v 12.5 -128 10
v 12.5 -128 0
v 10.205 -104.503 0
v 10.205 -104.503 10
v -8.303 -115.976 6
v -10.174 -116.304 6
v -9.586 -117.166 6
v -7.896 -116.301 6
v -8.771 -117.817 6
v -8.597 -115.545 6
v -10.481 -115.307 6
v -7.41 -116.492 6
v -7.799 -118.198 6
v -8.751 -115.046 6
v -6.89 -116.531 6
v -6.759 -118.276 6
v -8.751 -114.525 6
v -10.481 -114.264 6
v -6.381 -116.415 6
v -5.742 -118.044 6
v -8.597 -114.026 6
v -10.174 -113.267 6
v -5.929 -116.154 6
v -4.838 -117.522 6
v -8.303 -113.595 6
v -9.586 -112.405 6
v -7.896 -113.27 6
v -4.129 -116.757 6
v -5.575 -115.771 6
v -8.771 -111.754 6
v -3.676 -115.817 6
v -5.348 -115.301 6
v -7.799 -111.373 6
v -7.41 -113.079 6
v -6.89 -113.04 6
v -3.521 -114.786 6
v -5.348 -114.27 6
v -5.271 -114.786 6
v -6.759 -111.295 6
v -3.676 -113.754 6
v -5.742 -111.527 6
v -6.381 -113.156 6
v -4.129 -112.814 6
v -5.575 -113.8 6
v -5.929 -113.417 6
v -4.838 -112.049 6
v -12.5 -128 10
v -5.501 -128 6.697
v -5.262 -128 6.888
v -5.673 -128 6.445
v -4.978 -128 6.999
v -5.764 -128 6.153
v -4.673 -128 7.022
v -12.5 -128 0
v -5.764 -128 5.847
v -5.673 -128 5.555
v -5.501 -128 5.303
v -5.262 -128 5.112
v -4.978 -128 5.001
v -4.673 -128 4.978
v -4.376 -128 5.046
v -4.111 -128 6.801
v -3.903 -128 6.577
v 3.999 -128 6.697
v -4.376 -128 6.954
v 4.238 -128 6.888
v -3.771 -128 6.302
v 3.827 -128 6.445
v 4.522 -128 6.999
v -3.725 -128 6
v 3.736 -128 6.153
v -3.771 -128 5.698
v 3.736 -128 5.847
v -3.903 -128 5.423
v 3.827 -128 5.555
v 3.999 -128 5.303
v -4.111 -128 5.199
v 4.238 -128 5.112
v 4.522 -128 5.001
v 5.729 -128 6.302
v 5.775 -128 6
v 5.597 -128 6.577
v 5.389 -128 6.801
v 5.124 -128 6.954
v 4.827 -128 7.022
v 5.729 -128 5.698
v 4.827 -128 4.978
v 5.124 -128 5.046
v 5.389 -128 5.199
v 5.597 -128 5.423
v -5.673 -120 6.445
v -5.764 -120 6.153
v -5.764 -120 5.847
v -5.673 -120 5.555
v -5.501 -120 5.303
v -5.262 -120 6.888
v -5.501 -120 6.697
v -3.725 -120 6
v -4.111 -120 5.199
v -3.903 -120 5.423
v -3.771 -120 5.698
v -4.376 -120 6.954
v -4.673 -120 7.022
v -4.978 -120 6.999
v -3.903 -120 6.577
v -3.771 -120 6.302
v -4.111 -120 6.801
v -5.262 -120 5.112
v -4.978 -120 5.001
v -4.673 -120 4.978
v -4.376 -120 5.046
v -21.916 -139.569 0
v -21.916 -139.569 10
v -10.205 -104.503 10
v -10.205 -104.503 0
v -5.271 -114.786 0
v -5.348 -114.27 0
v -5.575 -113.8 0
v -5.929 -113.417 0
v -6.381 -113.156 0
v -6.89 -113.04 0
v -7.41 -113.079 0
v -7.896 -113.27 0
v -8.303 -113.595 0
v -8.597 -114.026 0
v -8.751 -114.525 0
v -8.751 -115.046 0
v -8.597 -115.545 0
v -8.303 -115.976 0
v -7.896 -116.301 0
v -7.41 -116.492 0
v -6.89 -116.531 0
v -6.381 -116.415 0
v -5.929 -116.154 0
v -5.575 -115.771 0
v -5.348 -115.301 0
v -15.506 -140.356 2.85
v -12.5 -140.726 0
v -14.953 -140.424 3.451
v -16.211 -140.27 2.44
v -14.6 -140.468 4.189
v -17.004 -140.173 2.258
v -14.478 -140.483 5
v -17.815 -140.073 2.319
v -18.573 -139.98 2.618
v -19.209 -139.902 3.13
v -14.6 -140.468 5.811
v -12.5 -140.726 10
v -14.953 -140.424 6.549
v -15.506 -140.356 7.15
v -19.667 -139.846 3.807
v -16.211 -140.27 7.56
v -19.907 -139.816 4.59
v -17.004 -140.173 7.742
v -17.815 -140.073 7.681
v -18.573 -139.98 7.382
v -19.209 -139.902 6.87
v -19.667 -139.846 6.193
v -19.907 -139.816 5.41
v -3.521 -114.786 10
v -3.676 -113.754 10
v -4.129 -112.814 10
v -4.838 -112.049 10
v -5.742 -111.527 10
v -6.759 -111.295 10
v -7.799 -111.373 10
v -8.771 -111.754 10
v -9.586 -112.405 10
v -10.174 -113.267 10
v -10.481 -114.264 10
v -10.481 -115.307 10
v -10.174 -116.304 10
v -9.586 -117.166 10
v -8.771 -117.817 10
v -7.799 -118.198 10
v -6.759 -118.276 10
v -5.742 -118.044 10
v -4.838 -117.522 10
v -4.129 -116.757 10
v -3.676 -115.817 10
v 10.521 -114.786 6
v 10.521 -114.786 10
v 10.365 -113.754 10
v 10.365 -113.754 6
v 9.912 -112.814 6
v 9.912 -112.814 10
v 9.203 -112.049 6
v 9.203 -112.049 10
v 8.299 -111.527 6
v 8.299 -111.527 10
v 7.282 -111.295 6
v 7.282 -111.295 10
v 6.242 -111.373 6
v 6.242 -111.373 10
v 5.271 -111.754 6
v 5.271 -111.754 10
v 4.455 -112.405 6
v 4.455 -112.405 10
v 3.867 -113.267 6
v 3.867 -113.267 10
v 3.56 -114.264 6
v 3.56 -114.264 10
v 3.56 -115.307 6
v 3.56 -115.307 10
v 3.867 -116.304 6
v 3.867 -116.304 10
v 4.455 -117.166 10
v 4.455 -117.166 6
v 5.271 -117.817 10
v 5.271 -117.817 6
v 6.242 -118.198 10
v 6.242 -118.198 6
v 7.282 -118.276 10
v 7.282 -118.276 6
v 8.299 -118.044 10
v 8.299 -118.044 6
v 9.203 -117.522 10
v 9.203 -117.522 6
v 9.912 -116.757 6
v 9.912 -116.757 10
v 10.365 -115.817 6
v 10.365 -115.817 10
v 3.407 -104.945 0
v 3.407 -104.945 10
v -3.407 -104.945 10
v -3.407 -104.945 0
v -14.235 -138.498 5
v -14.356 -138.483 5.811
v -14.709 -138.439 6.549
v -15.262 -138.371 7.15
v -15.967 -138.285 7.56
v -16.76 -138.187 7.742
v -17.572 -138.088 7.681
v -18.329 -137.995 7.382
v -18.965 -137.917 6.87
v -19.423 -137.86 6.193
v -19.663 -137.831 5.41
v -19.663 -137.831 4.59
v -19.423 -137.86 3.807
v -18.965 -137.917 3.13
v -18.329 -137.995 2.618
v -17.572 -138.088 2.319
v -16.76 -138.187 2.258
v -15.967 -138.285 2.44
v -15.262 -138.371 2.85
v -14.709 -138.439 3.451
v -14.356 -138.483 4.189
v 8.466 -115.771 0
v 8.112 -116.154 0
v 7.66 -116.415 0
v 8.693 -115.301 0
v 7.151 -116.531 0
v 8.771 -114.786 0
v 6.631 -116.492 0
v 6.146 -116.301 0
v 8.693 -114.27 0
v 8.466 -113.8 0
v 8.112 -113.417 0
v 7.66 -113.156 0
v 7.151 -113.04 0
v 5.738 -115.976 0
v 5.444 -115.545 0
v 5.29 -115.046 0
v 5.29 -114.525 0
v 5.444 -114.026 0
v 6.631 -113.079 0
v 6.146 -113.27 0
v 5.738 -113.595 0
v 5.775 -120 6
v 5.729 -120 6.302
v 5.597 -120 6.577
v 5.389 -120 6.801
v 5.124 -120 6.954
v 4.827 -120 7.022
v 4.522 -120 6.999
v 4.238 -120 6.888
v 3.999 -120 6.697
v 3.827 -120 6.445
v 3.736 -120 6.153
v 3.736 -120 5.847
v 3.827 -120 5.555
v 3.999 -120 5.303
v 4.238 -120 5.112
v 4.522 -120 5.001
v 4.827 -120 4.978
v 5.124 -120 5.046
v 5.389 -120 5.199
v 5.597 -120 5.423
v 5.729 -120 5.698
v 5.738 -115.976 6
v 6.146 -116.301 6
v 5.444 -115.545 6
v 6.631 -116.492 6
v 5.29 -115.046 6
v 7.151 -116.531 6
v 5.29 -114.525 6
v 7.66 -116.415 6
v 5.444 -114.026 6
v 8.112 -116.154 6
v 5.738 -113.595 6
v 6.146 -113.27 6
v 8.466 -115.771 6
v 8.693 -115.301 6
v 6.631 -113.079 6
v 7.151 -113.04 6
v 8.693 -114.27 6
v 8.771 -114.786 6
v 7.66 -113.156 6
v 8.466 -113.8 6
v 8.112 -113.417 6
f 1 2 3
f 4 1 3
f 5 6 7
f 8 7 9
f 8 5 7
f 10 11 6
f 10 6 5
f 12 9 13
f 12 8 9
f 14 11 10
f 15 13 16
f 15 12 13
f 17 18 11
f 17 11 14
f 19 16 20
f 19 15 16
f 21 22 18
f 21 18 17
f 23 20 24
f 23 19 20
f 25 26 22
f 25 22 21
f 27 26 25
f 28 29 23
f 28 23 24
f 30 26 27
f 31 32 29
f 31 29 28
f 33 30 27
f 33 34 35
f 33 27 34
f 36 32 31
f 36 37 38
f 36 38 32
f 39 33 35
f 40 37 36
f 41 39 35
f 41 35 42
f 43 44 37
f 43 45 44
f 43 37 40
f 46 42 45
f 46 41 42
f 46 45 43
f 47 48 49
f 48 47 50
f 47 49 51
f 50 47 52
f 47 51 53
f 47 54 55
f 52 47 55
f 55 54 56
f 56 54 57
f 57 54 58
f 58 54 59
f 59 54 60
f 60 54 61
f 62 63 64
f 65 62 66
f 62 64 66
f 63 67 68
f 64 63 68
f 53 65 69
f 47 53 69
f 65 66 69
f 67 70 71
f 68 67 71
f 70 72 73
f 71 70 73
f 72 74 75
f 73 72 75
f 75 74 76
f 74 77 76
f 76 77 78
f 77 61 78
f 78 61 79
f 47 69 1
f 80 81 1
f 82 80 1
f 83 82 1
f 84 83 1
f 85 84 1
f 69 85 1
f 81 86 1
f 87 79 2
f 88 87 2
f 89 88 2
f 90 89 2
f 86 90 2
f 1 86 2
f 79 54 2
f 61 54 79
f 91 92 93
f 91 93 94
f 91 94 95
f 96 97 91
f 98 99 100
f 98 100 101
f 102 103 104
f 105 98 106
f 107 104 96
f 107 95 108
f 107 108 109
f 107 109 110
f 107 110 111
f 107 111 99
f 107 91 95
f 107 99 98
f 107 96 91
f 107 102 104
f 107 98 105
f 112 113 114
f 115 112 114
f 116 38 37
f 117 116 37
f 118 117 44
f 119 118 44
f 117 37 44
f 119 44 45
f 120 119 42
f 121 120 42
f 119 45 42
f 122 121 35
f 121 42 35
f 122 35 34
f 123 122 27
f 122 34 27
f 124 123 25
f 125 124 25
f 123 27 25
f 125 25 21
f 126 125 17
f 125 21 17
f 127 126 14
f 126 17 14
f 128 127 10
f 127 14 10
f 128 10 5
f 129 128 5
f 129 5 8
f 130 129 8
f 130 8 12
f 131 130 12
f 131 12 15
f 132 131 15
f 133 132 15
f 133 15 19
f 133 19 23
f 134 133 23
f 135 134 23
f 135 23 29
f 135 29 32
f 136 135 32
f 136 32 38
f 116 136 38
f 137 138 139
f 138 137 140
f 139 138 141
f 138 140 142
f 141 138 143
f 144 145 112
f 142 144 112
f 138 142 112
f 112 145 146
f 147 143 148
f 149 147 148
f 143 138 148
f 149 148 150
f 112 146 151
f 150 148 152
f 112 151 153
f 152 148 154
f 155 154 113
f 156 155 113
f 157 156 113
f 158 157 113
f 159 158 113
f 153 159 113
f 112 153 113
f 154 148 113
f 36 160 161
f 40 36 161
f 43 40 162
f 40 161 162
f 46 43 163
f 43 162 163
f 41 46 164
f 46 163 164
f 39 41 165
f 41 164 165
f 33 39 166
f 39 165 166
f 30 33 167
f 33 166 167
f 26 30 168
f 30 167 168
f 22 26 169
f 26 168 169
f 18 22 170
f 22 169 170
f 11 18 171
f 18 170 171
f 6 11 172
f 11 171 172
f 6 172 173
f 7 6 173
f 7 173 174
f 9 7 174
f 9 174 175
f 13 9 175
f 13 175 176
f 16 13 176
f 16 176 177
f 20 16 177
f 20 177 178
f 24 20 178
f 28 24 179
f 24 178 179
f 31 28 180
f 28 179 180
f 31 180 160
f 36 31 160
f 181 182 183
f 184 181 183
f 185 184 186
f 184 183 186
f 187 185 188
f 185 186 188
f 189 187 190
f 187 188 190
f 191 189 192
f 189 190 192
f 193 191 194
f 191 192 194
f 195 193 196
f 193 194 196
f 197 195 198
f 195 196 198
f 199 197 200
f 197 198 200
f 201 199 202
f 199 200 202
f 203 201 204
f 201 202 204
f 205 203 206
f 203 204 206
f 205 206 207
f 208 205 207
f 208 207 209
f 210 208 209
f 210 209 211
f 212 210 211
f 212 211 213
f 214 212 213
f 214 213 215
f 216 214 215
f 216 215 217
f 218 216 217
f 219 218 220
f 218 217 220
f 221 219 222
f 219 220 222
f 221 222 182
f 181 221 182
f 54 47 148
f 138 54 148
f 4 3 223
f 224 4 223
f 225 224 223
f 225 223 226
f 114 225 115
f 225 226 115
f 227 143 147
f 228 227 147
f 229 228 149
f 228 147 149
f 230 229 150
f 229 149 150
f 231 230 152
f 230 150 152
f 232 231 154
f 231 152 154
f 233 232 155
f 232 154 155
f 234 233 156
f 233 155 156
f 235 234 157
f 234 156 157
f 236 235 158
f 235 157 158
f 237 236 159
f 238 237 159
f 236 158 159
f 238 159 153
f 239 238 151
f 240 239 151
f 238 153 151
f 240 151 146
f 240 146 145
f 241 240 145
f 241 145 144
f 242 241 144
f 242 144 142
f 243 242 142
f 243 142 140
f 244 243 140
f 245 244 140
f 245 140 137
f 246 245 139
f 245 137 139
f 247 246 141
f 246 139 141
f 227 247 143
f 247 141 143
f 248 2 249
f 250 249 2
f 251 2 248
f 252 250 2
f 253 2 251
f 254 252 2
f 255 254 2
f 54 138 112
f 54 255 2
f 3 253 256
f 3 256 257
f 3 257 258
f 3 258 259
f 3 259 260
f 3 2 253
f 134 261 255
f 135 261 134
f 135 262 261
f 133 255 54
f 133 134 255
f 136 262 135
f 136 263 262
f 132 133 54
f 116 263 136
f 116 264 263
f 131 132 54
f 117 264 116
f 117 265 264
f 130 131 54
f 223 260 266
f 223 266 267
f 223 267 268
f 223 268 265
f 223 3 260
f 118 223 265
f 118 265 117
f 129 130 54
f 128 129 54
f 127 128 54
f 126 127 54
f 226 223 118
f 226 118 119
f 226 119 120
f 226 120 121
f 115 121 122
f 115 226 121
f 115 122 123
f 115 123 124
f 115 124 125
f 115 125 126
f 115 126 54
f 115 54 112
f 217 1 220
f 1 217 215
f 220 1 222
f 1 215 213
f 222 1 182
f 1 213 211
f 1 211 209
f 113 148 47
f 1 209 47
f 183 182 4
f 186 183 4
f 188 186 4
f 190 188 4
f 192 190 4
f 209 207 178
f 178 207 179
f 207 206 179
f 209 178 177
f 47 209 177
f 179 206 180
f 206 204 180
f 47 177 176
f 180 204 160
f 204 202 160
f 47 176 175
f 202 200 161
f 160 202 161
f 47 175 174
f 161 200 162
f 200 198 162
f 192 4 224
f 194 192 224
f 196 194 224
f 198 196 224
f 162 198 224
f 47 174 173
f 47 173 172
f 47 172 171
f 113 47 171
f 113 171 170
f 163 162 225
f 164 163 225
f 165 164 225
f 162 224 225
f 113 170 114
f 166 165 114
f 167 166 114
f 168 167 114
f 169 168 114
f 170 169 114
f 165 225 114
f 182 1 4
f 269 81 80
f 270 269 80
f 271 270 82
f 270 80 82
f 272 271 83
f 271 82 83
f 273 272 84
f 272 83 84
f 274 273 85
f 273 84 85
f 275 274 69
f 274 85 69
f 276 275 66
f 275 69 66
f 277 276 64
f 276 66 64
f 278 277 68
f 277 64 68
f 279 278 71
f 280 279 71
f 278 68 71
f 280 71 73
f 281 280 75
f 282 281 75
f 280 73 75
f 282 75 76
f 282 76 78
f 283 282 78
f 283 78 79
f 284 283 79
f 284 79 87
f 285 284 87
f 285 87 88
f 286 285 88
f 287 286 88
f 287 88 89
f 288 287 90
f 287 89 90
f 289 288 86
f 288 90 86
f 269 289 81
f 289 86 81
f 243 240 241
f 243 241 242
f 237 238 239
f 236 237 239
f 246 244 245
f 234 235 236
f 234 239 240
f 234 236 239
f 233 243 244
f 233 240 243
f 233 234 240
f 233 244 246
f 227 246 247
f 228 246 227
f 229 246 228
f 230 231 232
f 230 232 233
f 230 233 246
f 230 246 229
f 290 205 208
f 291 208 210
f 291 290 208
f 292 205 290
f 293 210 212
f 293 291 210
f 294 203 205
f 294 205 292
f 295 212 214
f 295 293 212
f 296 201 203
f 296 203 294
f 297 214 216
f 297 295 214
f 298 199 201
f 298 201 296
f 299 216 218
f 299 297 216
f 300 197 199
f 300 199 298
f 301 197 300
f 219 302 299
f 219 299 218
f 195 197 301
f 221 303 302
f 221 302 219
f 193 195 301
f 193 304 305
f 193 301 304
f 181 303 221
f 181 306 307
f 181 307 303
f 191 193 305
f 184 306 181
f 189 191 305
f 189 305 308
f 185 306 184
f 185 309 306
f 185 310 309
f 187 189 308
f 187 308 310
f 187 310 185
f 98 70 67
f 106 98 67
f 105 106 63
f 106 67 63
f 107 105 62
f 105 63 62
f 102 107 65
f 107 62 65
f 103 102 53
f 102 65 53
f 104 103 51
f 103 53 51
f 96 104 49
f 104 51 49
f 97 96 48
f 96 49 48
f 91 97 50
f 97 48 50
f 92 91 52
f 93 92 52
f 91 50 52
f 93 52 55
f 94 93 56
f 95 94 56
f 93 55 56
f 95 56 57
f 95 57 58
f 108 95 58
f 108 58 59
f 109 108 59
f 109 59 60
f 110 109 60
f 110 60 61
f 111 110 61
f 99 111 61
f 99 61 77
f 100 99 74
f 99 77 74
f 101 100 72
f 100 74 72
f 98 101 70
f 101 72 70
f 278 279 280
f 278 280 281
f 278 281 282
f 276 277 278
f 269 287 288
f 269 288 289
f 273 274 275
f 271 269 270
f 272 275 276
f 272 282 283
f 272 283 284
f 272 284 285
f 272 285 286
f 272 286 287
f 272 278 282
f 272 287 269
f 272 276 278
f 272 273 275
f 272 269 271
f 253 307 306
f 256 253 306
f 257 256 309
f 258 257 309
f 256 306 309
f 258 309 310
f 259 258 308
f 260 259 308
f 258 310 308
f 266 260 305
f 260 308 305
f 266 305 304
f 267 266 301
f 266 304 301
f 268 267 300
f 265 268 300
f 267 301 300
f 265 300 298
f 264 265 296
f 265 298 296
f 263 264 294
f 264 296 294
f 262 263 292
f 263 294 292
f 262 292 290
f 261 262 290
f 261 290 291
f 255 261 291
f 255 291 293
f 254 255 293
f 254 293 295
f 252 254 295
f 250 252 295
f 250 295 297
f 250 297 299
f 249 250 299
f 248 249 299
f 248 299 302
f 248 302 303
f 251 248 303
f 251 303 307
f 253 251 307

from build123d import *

# Parameters (mm, degrees)
BOSS_EXTRU_1_DEPTH      = 10
ESQUISSE2_R             = 1.025
ENL_V_MAT_EXTRU_1_DEPTH = 8
ENL_V_MAT_EXTRU_2_REACH = 130.997
ESQUISSE3_R             = 1.75
ESQUISSE4_R             = 3.5
ESQUISSE4_R_2           = 1.75
ENL_V_MAT_EXTRU_3_DEPTH = 4
BOSS_EXTRU_2_DEPTH      = 10
ESQUISSE6_R             = 2.75
ENL_V_MAT_EXTRU_4_DEPTH = 2


with BuildPart() as part:
    # Esquisse1 → Boss.-Extru.1 (new body)
    with BuildSketch(Plane.XY):
        with BuildLine():
            Line((-12.5, -128), (12.5, -128))
            Line((12.5, -128), (10.205358779, -104.502873894))
            ThreePointArc((10.205358779, -104.502873894), (0, -105), (-10.205358779, -104.502873894))
            Line((-10.205358779, -104.502873894), (-12.5, -128))
        make_face()
    extrude(amount=BOSS_EXTRU_1_DEPTH)

    # Esquisse2 → Enlèv. mat.-Extru.1 (cut)
    with BuildSketch(Plane.XZ.offset(128)):
        with Locations((-4.75, 6)):
            Circle(ESQUISSE2_R)
        with Locations((4.75, 6)):
            Circle(ESQUISSE2_R)
    extrude(amount=-ENL_V_MAT_EXTRU_1_DEPTH, mode=Mode.SUBTRACT)

    # Esquisse3 → Enlèv. mat.-Extru.2 (cut, up to next)
    with BuildSketch(Plane.XY.offset(10), mode=Mode.PRIVATE) as enl_v_mat_extru_2_sk1:
        with Locations((-7.020582047, -114.785501819)):
            Circle(ESQUISSE3_R)
    enl_v_mat_extru_2_tool1 = extrude(enl_v_mat_extru_2_sk1.sketch, amount=-ENL_V_MAT_EXTRU_2_REACH, mode=Mode.PRIVATE) & part.part
    # Esquisse3 → Enlèv. mat.-Extru.2 (cut, up to next)
    with BuildSketch(Plane.XY.offset(10), mode=Mode.PRIVATE) as enl_v_mat_extru_2_sk2:
        with Locations((7.020582047, -114.785501819)):
            Circle(ESQUISSE3_R)
    enl_v_mat_extru_2_tool2 = extrude(enl_v_mat_extru_2_sk2.sketch, amount=-ENL_V_MAT_EXTRU_2_REACH, mode=Mode.PRIVATE) & part.part
    add(enl_v_mat_extru_2_tool1.solids().sort_by_distance((-7.020582, -114.785502, 10))[0], mode=Mode.SUBTRACT)
    add(enl_v_mat_extru_2_tool2.solids().sort_by_distance((7.020582, -114.785502, 10))[0], mode=Mode.SUBTRACT)

    # Esquisse4 → Enlèv. mat.-Extru.3 (cut)
    # profile 1 of 2: a face of its own
    with BuildSketch(Plane.XY.offset(10)):
        with Locations((7.020582047, -114.785501819)):
            Circle(ESQUISSE4_R)
        with Locations((7.020582047, -114.785501819)):
            Circle(ESQUISSE4_R_2, mode=Mode.SUBTRACT)
    # profile 2 of 2: a face of its own
    with BuildSketch(Plane.XY.offset(10)):
        with Locations((-7.020582047, -114.785501819)):
            Circle(ESQUISSE4_R)
    extrude(amount=-ENL_V_MAT_EXTRU_3_DEPTH, mode=Mode.SUBTRACT)

    # Esquisse5 → Boss.-Extru.2 (add)
    with BuildSketch(Plane.XY.offset(10)):
        Polygon((-12.5, -140.725580344), (-21.915902578, -139.56945288), (-10.205358779, -104.502873894), (-12.5, -128), align=None)
    extrude(amount=-BOSS_EXTRU_2_DEPTH)

    # Esquisse6 → Enlèv. mat.-Extru.4 (cut)
    with BuildSketch(Plane(origin=(-17.207951289, -140.147516612, 0), x_dir=(0.9925461516413231, -0.12186934340513994, 0), z_dir=(-0.12186934340513994, -0.9925461516413231, 0))):
        with Locations((0, 5)):
            Circle(ESQUISSE6_R)
    extrude(amount=-ENL_V_MAT_EXTRU_4_DEPTH, mode=Mode.SUBTRACT)


solid = part.part
